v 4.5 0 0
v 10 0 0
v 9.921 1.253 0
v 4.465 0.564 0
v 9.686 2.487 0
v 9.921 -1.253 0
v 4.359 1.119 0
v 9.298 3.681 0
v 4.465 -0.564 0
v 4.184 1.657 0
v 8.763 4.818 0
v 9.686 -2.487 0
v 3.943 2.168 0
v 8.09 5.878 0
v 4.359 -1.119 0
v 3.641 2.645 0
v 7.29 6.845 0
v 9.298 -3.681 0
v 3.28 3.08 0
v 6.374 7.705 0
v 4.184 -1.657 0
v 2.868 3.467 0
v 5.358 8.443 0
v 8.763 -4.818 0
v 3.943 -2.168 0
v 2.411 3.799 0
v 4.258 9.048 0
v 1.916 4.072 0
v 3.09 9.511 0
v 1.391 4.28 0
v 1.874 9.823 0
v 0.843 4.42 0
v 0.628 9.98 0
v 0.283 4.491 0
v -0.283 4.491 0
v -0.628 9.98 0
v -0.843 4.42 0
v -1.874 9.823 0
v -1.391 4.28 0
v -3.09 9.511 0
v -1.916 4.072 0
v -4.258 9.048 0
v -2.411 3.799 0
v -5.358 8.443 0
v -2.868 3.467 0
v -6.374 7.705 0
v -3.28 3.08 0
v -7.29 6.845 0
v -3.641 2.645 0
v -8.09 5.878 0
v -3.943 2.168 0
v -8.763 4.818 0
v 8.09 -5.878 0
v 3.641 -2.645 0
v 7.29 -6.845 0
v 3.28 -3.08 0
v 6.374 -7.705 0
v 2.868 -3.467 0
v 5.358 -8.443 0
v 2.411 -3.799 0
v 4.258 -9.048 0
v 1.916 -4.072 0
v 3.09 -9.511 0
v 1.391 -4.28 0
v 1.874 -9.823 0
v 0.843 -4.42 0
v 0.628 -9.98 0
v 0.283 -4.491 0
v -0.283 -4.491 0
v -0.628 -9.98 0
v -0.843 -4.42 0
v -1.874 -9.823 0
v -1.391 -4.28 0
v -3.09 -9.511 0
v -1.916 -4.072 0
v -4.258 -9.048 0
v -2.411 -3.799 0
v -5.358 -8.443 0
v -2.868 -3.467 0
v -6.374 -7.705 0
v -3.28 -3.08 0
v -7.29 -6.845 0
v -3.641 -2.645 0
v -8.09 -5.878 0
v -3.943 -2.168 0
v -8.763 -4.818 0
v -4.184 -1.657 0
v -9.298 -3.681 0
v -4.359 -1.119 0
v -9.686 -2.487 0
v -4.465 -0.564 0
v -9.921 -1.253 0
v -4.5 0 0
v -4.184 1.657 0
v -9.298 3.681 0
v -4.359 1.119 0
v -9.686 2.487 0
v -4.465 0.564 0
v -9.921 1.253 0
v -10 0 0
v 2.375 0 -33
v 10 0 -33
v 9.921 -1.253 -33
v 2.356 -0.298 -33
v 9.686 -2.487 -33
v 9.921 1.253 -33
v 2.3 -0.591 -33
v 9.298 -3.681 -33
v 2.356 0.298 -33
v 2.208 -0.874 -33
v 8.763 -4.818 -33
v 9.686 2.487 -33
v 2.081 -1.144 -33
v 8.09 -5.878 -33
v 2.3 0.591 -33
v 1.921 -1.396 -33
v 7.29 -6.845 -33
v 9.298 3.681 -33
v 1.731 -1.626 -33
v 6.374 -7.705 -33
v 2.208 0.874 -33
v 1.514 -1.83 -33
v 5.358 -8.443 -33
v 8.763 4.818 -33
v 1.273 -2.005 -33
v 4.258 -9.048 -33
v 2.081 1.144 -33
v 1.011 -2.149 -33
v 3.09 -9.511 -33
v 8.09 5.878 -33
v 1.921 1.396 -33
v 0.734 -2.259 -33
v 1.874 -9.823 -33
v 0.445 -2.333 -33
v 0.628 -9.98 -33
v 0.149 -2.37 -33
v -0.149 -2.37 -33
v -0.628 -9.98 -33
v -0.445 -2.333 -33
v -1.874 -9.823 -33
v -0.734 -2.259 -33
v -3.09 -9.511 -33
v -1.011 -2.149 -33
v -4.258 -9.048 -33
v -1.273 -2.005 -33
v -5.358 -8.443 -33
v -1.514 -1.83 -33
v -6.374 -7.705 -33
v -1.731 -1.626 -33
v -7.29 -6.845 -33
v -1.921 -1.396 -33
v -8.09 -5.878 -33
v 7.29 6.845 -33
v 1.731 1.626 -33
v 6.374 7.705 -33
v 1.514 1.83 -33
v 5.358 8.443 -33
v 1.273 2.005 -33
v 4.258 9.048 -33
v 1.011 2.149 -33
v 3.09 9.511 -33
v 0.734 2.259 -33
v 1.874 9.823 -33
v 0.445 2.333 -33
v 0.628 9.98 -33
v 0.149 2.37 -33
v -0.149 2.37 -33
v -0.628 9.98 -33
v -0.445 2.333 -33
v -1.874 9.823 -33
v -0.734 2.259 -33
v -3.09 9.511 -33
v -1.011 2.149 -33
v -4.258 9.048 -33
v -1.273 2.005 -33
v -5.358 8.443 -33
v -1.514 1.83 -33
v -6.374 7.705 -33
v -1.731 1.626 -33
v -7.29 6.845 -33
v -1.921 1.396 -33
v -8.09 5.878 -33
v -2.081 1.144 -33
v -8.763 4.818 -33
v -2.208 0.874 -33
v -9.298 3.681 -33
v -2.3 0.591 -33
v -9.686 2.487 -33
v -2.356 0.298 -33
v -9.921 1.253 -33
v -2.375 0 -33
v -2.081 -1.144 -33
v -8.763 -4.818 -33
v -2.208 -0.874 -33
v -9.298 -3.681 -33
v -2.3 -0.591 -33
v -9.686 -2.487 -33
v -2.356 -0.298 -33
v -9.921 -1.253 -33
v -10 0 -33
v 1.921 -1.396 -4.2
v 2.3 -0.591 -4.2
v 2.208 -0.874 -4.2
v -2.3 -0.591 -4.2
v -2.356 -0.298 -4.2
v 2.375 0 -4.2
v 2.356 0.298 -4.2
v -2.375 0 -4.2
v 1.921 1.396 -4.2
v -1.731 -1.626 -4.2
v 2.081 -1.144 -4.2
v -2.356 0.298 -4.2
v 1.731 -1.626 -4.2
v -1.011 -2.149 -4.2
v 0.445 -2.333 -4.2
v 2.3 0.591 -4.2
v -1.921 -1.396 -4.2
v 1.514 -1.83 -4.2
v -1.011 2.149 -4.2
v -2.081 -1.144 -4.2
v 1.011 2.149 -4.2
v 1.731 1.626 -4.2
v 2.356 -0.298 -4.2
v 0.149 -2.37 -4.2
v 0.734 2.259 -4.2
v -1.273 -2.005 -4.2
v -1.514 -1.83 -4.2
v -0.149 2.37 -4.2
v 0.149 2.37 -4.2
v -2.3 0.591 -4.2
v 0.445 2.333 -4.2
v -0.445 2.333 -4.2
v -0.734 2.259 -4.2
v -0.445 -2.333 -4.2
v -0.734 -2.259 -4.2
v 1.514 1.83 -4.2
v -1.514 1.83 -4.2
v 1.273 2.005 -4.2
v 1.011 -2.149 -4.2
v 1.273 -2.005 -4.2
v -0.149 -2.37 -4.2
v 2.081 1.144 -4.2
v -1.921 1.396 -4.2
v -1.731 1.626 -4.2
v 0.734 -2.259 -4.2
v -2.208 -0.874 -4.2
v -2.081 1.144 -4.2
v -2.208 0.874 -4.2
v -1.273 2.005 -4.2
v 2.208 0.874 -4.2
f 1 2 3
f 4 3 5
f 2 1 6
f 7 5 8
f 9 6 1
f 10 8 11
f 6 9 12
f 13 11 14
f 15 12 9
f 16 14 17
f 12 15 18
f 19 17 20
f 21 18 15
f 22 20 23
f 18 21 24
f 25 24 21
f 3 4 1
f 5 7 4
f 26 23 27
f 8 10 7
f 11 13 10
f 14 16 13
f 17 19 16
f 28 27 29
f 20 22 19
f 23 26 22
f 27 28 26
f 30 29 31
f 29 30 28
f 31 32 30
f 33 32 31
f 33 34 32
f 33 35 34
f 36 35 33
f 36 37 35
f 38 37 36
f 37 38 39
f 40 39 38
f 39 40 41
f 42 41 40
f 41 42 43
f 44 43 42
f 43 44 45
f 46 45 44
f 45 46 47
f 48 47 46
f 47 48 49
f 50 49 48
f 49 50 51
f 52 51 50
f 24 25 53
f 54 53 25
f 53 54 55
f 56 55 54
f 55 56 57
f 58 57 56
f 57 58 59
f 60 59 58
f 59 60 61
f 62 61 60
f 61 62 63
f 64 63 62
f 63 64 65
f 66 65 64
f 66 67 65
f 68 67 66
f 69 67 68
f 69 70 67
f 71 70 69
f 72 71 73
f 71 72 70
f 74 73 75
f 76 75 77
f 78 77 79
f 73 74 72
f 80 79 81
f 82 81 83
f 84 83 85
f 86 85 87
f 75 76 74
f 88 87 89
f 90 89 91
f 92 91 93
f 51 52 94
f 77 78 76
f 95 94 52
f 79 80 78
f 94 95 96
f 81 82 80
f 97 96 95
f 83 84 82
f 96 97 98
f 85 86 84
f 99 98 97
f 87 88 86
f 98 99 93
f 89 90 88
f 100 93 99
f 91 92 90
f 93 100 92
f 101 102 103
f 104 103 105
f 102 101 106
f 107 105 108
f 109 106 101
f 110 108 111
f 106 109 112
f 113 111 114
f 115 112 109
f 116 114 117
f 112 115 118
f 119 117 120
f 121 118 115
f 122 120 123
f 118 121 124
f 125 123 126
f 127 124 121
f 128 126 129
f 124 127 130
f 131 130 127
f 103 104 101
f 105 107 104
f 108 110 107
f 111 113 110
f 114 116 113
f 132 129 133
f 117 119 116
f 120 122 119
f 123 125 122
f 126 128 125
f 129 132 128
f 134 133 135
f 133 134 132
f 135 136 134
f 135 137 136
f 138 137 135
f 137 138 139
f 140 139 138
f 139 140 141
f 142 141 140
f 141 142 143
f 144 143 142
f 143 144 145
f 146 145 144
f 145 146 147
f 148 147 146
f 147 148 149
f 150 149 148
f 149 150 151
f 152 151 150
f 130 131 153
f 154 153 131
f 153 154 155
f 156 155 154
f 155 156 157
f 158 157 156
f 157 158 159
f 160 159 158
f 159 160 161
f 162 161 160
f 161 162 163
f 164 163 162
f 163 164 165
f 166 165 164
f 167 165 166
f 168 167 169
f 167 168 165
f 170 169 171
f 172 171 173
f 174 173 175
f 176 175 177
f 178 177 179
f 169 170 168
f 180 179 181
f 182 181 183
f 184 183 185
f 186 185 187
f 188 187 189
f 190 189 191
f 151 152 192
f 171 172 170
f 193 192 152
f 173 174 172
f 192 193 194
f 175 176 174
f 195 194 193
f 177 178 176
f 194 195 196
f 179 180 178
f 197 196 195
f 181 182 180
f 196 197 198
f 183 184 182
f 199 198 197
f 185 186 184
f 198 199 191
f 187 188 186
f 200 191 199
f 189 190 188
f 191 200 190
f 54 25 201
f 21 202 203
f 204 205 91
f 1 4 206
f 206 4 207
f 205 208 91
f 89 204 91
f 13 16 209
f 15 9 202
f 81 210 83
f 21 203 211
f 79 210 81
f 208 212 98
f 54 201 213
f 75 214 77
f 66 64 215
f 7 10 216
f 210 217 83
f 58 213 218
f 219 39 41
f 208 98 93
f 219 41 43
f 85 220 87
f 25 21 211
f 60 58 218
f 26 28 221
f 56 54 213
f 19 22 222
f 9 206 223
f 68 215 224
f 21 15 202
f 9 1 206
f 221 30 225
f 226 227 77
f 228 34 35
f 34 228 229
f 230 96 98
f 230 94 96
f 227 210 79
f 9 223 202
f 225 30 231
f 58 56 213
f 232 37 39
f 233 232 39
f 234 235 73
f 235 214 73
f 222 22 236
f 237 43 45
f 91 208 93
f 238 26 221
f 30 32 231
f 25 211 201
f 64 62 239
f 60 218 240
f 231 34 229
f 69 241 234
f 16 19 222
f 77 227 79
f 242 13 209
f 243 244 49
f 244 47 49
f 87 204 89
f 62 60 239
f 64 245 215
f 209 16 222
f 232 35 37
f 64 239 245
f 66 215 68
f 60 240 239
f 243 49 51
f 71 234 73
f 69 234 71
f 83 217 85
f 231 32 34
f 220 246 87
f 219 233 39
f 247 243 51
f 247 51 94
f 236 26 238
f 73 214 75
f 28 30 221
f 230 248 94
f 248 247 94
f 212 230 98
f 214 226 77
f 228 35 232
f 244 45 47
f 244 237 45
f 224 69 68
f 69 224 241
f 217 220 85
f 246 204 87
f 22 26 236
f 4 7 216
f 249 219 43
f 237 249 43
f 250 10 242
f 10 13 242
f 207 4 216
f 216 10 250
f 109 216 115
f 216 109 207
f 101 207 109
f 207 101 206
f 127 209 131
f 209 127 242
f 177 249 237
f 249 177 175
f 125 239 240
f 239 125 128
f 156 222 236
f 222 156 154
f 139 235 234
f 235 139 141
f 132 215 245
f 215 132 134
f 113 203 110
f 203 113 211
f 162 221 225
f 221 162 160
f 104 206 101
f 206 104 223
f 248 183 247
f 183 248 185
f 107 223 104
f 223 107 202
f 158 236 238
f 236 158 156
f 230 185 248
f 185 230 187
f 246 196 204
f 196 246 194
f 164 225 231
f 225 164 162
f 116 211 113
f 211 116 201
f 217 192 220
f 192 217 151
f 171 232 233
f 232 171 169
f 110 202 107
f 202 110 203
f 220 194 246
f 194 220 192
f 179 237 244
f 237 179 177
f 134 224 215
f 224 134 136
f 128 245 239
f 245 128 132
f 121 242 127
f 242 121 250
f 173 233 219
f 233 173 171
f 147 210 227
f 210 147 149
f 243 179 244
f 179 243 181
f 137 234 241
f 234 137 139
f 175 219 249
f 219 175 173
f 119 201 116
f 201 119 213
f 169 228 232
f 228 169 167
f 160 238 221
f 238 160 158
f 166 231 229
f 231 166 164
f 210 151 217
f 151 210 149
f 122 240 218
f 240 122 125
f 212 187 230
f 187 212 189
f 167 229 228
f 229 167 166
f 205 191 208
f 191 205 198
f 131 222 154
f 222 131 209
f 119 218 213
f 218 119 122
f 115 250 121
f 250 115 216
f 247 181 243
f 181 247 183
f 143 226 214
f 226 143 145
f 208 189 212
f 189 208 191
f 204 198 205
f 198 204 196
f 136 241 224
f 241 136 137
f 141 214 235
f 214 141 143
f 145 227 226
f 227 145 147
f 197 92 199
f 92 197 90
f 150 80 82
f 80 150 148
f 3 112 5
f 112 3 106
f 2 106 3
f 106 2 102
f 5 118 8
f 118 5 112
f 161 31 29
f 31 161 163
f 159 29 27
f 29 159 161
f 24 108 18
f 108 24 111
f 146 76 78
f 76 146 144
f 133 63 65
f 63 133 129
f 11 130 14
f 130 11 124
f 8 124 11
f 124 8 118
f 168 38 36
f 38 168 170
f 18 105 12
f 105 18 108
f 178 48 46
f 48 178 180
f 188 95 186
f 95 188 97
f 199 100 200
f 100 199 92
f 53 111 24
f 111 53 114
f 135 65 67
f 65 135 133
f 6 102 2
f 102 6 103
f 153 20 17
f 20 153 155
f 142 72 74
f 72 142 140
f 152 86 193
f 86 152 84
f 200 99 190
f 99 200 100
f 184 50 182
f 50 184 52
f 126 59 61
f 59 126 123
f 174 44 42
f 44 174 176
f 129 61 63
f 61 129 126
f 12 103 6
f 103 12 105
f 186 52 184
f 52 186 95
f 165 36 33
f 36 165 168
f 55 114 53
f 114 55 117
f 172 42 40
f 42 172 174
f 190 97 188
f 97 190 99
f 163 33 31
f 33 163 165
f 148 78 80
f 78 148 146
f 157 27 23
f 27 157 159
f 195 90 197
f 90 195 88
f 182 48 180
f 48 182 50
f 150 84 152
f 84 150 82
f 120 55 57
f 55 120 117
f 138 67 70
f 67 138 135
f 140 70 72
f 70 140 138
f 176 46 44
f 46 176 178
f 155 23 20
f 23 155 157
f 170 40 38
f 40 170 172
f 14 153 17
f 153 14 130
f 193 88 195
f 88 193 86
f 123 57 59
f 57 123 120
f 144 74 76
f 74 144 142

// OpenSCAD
$fn = 50;


difference() {
	union() {
		translate(v = [0, 0, -33.0000000000]) {
			cylinder(h = 33, r = 10.0000000000);
		}
		cylinder(h = 0, r = 16.0000000000);
	}
	union() {
		translate(v = [0, 0, 0]) {
			rotate(a = [0, 0, 0]) {
				difference() {
					union() {
						#translate(v = [0, 0, -33.0000000000]) {
							cylinder(h = 33, r = 2.2500000000);
						}
						#translate(v = [0, 0, -4.2000000000]) {
							cylinder(h = 4.2000000000, r1 = 2.3750000000, r2 = 4.5000000000);
						}
						#translate(v = [0, 0, -33.0000000000]) {
							cylinder(h = 33, r = 2.3750000000);
						}
						#translate(v = [0, 0, -33.0000000000]) {
							cylinder(h = 33, r = 2.2500000000);
						}
					}
					union();
				}
			}
		}
	}
}
